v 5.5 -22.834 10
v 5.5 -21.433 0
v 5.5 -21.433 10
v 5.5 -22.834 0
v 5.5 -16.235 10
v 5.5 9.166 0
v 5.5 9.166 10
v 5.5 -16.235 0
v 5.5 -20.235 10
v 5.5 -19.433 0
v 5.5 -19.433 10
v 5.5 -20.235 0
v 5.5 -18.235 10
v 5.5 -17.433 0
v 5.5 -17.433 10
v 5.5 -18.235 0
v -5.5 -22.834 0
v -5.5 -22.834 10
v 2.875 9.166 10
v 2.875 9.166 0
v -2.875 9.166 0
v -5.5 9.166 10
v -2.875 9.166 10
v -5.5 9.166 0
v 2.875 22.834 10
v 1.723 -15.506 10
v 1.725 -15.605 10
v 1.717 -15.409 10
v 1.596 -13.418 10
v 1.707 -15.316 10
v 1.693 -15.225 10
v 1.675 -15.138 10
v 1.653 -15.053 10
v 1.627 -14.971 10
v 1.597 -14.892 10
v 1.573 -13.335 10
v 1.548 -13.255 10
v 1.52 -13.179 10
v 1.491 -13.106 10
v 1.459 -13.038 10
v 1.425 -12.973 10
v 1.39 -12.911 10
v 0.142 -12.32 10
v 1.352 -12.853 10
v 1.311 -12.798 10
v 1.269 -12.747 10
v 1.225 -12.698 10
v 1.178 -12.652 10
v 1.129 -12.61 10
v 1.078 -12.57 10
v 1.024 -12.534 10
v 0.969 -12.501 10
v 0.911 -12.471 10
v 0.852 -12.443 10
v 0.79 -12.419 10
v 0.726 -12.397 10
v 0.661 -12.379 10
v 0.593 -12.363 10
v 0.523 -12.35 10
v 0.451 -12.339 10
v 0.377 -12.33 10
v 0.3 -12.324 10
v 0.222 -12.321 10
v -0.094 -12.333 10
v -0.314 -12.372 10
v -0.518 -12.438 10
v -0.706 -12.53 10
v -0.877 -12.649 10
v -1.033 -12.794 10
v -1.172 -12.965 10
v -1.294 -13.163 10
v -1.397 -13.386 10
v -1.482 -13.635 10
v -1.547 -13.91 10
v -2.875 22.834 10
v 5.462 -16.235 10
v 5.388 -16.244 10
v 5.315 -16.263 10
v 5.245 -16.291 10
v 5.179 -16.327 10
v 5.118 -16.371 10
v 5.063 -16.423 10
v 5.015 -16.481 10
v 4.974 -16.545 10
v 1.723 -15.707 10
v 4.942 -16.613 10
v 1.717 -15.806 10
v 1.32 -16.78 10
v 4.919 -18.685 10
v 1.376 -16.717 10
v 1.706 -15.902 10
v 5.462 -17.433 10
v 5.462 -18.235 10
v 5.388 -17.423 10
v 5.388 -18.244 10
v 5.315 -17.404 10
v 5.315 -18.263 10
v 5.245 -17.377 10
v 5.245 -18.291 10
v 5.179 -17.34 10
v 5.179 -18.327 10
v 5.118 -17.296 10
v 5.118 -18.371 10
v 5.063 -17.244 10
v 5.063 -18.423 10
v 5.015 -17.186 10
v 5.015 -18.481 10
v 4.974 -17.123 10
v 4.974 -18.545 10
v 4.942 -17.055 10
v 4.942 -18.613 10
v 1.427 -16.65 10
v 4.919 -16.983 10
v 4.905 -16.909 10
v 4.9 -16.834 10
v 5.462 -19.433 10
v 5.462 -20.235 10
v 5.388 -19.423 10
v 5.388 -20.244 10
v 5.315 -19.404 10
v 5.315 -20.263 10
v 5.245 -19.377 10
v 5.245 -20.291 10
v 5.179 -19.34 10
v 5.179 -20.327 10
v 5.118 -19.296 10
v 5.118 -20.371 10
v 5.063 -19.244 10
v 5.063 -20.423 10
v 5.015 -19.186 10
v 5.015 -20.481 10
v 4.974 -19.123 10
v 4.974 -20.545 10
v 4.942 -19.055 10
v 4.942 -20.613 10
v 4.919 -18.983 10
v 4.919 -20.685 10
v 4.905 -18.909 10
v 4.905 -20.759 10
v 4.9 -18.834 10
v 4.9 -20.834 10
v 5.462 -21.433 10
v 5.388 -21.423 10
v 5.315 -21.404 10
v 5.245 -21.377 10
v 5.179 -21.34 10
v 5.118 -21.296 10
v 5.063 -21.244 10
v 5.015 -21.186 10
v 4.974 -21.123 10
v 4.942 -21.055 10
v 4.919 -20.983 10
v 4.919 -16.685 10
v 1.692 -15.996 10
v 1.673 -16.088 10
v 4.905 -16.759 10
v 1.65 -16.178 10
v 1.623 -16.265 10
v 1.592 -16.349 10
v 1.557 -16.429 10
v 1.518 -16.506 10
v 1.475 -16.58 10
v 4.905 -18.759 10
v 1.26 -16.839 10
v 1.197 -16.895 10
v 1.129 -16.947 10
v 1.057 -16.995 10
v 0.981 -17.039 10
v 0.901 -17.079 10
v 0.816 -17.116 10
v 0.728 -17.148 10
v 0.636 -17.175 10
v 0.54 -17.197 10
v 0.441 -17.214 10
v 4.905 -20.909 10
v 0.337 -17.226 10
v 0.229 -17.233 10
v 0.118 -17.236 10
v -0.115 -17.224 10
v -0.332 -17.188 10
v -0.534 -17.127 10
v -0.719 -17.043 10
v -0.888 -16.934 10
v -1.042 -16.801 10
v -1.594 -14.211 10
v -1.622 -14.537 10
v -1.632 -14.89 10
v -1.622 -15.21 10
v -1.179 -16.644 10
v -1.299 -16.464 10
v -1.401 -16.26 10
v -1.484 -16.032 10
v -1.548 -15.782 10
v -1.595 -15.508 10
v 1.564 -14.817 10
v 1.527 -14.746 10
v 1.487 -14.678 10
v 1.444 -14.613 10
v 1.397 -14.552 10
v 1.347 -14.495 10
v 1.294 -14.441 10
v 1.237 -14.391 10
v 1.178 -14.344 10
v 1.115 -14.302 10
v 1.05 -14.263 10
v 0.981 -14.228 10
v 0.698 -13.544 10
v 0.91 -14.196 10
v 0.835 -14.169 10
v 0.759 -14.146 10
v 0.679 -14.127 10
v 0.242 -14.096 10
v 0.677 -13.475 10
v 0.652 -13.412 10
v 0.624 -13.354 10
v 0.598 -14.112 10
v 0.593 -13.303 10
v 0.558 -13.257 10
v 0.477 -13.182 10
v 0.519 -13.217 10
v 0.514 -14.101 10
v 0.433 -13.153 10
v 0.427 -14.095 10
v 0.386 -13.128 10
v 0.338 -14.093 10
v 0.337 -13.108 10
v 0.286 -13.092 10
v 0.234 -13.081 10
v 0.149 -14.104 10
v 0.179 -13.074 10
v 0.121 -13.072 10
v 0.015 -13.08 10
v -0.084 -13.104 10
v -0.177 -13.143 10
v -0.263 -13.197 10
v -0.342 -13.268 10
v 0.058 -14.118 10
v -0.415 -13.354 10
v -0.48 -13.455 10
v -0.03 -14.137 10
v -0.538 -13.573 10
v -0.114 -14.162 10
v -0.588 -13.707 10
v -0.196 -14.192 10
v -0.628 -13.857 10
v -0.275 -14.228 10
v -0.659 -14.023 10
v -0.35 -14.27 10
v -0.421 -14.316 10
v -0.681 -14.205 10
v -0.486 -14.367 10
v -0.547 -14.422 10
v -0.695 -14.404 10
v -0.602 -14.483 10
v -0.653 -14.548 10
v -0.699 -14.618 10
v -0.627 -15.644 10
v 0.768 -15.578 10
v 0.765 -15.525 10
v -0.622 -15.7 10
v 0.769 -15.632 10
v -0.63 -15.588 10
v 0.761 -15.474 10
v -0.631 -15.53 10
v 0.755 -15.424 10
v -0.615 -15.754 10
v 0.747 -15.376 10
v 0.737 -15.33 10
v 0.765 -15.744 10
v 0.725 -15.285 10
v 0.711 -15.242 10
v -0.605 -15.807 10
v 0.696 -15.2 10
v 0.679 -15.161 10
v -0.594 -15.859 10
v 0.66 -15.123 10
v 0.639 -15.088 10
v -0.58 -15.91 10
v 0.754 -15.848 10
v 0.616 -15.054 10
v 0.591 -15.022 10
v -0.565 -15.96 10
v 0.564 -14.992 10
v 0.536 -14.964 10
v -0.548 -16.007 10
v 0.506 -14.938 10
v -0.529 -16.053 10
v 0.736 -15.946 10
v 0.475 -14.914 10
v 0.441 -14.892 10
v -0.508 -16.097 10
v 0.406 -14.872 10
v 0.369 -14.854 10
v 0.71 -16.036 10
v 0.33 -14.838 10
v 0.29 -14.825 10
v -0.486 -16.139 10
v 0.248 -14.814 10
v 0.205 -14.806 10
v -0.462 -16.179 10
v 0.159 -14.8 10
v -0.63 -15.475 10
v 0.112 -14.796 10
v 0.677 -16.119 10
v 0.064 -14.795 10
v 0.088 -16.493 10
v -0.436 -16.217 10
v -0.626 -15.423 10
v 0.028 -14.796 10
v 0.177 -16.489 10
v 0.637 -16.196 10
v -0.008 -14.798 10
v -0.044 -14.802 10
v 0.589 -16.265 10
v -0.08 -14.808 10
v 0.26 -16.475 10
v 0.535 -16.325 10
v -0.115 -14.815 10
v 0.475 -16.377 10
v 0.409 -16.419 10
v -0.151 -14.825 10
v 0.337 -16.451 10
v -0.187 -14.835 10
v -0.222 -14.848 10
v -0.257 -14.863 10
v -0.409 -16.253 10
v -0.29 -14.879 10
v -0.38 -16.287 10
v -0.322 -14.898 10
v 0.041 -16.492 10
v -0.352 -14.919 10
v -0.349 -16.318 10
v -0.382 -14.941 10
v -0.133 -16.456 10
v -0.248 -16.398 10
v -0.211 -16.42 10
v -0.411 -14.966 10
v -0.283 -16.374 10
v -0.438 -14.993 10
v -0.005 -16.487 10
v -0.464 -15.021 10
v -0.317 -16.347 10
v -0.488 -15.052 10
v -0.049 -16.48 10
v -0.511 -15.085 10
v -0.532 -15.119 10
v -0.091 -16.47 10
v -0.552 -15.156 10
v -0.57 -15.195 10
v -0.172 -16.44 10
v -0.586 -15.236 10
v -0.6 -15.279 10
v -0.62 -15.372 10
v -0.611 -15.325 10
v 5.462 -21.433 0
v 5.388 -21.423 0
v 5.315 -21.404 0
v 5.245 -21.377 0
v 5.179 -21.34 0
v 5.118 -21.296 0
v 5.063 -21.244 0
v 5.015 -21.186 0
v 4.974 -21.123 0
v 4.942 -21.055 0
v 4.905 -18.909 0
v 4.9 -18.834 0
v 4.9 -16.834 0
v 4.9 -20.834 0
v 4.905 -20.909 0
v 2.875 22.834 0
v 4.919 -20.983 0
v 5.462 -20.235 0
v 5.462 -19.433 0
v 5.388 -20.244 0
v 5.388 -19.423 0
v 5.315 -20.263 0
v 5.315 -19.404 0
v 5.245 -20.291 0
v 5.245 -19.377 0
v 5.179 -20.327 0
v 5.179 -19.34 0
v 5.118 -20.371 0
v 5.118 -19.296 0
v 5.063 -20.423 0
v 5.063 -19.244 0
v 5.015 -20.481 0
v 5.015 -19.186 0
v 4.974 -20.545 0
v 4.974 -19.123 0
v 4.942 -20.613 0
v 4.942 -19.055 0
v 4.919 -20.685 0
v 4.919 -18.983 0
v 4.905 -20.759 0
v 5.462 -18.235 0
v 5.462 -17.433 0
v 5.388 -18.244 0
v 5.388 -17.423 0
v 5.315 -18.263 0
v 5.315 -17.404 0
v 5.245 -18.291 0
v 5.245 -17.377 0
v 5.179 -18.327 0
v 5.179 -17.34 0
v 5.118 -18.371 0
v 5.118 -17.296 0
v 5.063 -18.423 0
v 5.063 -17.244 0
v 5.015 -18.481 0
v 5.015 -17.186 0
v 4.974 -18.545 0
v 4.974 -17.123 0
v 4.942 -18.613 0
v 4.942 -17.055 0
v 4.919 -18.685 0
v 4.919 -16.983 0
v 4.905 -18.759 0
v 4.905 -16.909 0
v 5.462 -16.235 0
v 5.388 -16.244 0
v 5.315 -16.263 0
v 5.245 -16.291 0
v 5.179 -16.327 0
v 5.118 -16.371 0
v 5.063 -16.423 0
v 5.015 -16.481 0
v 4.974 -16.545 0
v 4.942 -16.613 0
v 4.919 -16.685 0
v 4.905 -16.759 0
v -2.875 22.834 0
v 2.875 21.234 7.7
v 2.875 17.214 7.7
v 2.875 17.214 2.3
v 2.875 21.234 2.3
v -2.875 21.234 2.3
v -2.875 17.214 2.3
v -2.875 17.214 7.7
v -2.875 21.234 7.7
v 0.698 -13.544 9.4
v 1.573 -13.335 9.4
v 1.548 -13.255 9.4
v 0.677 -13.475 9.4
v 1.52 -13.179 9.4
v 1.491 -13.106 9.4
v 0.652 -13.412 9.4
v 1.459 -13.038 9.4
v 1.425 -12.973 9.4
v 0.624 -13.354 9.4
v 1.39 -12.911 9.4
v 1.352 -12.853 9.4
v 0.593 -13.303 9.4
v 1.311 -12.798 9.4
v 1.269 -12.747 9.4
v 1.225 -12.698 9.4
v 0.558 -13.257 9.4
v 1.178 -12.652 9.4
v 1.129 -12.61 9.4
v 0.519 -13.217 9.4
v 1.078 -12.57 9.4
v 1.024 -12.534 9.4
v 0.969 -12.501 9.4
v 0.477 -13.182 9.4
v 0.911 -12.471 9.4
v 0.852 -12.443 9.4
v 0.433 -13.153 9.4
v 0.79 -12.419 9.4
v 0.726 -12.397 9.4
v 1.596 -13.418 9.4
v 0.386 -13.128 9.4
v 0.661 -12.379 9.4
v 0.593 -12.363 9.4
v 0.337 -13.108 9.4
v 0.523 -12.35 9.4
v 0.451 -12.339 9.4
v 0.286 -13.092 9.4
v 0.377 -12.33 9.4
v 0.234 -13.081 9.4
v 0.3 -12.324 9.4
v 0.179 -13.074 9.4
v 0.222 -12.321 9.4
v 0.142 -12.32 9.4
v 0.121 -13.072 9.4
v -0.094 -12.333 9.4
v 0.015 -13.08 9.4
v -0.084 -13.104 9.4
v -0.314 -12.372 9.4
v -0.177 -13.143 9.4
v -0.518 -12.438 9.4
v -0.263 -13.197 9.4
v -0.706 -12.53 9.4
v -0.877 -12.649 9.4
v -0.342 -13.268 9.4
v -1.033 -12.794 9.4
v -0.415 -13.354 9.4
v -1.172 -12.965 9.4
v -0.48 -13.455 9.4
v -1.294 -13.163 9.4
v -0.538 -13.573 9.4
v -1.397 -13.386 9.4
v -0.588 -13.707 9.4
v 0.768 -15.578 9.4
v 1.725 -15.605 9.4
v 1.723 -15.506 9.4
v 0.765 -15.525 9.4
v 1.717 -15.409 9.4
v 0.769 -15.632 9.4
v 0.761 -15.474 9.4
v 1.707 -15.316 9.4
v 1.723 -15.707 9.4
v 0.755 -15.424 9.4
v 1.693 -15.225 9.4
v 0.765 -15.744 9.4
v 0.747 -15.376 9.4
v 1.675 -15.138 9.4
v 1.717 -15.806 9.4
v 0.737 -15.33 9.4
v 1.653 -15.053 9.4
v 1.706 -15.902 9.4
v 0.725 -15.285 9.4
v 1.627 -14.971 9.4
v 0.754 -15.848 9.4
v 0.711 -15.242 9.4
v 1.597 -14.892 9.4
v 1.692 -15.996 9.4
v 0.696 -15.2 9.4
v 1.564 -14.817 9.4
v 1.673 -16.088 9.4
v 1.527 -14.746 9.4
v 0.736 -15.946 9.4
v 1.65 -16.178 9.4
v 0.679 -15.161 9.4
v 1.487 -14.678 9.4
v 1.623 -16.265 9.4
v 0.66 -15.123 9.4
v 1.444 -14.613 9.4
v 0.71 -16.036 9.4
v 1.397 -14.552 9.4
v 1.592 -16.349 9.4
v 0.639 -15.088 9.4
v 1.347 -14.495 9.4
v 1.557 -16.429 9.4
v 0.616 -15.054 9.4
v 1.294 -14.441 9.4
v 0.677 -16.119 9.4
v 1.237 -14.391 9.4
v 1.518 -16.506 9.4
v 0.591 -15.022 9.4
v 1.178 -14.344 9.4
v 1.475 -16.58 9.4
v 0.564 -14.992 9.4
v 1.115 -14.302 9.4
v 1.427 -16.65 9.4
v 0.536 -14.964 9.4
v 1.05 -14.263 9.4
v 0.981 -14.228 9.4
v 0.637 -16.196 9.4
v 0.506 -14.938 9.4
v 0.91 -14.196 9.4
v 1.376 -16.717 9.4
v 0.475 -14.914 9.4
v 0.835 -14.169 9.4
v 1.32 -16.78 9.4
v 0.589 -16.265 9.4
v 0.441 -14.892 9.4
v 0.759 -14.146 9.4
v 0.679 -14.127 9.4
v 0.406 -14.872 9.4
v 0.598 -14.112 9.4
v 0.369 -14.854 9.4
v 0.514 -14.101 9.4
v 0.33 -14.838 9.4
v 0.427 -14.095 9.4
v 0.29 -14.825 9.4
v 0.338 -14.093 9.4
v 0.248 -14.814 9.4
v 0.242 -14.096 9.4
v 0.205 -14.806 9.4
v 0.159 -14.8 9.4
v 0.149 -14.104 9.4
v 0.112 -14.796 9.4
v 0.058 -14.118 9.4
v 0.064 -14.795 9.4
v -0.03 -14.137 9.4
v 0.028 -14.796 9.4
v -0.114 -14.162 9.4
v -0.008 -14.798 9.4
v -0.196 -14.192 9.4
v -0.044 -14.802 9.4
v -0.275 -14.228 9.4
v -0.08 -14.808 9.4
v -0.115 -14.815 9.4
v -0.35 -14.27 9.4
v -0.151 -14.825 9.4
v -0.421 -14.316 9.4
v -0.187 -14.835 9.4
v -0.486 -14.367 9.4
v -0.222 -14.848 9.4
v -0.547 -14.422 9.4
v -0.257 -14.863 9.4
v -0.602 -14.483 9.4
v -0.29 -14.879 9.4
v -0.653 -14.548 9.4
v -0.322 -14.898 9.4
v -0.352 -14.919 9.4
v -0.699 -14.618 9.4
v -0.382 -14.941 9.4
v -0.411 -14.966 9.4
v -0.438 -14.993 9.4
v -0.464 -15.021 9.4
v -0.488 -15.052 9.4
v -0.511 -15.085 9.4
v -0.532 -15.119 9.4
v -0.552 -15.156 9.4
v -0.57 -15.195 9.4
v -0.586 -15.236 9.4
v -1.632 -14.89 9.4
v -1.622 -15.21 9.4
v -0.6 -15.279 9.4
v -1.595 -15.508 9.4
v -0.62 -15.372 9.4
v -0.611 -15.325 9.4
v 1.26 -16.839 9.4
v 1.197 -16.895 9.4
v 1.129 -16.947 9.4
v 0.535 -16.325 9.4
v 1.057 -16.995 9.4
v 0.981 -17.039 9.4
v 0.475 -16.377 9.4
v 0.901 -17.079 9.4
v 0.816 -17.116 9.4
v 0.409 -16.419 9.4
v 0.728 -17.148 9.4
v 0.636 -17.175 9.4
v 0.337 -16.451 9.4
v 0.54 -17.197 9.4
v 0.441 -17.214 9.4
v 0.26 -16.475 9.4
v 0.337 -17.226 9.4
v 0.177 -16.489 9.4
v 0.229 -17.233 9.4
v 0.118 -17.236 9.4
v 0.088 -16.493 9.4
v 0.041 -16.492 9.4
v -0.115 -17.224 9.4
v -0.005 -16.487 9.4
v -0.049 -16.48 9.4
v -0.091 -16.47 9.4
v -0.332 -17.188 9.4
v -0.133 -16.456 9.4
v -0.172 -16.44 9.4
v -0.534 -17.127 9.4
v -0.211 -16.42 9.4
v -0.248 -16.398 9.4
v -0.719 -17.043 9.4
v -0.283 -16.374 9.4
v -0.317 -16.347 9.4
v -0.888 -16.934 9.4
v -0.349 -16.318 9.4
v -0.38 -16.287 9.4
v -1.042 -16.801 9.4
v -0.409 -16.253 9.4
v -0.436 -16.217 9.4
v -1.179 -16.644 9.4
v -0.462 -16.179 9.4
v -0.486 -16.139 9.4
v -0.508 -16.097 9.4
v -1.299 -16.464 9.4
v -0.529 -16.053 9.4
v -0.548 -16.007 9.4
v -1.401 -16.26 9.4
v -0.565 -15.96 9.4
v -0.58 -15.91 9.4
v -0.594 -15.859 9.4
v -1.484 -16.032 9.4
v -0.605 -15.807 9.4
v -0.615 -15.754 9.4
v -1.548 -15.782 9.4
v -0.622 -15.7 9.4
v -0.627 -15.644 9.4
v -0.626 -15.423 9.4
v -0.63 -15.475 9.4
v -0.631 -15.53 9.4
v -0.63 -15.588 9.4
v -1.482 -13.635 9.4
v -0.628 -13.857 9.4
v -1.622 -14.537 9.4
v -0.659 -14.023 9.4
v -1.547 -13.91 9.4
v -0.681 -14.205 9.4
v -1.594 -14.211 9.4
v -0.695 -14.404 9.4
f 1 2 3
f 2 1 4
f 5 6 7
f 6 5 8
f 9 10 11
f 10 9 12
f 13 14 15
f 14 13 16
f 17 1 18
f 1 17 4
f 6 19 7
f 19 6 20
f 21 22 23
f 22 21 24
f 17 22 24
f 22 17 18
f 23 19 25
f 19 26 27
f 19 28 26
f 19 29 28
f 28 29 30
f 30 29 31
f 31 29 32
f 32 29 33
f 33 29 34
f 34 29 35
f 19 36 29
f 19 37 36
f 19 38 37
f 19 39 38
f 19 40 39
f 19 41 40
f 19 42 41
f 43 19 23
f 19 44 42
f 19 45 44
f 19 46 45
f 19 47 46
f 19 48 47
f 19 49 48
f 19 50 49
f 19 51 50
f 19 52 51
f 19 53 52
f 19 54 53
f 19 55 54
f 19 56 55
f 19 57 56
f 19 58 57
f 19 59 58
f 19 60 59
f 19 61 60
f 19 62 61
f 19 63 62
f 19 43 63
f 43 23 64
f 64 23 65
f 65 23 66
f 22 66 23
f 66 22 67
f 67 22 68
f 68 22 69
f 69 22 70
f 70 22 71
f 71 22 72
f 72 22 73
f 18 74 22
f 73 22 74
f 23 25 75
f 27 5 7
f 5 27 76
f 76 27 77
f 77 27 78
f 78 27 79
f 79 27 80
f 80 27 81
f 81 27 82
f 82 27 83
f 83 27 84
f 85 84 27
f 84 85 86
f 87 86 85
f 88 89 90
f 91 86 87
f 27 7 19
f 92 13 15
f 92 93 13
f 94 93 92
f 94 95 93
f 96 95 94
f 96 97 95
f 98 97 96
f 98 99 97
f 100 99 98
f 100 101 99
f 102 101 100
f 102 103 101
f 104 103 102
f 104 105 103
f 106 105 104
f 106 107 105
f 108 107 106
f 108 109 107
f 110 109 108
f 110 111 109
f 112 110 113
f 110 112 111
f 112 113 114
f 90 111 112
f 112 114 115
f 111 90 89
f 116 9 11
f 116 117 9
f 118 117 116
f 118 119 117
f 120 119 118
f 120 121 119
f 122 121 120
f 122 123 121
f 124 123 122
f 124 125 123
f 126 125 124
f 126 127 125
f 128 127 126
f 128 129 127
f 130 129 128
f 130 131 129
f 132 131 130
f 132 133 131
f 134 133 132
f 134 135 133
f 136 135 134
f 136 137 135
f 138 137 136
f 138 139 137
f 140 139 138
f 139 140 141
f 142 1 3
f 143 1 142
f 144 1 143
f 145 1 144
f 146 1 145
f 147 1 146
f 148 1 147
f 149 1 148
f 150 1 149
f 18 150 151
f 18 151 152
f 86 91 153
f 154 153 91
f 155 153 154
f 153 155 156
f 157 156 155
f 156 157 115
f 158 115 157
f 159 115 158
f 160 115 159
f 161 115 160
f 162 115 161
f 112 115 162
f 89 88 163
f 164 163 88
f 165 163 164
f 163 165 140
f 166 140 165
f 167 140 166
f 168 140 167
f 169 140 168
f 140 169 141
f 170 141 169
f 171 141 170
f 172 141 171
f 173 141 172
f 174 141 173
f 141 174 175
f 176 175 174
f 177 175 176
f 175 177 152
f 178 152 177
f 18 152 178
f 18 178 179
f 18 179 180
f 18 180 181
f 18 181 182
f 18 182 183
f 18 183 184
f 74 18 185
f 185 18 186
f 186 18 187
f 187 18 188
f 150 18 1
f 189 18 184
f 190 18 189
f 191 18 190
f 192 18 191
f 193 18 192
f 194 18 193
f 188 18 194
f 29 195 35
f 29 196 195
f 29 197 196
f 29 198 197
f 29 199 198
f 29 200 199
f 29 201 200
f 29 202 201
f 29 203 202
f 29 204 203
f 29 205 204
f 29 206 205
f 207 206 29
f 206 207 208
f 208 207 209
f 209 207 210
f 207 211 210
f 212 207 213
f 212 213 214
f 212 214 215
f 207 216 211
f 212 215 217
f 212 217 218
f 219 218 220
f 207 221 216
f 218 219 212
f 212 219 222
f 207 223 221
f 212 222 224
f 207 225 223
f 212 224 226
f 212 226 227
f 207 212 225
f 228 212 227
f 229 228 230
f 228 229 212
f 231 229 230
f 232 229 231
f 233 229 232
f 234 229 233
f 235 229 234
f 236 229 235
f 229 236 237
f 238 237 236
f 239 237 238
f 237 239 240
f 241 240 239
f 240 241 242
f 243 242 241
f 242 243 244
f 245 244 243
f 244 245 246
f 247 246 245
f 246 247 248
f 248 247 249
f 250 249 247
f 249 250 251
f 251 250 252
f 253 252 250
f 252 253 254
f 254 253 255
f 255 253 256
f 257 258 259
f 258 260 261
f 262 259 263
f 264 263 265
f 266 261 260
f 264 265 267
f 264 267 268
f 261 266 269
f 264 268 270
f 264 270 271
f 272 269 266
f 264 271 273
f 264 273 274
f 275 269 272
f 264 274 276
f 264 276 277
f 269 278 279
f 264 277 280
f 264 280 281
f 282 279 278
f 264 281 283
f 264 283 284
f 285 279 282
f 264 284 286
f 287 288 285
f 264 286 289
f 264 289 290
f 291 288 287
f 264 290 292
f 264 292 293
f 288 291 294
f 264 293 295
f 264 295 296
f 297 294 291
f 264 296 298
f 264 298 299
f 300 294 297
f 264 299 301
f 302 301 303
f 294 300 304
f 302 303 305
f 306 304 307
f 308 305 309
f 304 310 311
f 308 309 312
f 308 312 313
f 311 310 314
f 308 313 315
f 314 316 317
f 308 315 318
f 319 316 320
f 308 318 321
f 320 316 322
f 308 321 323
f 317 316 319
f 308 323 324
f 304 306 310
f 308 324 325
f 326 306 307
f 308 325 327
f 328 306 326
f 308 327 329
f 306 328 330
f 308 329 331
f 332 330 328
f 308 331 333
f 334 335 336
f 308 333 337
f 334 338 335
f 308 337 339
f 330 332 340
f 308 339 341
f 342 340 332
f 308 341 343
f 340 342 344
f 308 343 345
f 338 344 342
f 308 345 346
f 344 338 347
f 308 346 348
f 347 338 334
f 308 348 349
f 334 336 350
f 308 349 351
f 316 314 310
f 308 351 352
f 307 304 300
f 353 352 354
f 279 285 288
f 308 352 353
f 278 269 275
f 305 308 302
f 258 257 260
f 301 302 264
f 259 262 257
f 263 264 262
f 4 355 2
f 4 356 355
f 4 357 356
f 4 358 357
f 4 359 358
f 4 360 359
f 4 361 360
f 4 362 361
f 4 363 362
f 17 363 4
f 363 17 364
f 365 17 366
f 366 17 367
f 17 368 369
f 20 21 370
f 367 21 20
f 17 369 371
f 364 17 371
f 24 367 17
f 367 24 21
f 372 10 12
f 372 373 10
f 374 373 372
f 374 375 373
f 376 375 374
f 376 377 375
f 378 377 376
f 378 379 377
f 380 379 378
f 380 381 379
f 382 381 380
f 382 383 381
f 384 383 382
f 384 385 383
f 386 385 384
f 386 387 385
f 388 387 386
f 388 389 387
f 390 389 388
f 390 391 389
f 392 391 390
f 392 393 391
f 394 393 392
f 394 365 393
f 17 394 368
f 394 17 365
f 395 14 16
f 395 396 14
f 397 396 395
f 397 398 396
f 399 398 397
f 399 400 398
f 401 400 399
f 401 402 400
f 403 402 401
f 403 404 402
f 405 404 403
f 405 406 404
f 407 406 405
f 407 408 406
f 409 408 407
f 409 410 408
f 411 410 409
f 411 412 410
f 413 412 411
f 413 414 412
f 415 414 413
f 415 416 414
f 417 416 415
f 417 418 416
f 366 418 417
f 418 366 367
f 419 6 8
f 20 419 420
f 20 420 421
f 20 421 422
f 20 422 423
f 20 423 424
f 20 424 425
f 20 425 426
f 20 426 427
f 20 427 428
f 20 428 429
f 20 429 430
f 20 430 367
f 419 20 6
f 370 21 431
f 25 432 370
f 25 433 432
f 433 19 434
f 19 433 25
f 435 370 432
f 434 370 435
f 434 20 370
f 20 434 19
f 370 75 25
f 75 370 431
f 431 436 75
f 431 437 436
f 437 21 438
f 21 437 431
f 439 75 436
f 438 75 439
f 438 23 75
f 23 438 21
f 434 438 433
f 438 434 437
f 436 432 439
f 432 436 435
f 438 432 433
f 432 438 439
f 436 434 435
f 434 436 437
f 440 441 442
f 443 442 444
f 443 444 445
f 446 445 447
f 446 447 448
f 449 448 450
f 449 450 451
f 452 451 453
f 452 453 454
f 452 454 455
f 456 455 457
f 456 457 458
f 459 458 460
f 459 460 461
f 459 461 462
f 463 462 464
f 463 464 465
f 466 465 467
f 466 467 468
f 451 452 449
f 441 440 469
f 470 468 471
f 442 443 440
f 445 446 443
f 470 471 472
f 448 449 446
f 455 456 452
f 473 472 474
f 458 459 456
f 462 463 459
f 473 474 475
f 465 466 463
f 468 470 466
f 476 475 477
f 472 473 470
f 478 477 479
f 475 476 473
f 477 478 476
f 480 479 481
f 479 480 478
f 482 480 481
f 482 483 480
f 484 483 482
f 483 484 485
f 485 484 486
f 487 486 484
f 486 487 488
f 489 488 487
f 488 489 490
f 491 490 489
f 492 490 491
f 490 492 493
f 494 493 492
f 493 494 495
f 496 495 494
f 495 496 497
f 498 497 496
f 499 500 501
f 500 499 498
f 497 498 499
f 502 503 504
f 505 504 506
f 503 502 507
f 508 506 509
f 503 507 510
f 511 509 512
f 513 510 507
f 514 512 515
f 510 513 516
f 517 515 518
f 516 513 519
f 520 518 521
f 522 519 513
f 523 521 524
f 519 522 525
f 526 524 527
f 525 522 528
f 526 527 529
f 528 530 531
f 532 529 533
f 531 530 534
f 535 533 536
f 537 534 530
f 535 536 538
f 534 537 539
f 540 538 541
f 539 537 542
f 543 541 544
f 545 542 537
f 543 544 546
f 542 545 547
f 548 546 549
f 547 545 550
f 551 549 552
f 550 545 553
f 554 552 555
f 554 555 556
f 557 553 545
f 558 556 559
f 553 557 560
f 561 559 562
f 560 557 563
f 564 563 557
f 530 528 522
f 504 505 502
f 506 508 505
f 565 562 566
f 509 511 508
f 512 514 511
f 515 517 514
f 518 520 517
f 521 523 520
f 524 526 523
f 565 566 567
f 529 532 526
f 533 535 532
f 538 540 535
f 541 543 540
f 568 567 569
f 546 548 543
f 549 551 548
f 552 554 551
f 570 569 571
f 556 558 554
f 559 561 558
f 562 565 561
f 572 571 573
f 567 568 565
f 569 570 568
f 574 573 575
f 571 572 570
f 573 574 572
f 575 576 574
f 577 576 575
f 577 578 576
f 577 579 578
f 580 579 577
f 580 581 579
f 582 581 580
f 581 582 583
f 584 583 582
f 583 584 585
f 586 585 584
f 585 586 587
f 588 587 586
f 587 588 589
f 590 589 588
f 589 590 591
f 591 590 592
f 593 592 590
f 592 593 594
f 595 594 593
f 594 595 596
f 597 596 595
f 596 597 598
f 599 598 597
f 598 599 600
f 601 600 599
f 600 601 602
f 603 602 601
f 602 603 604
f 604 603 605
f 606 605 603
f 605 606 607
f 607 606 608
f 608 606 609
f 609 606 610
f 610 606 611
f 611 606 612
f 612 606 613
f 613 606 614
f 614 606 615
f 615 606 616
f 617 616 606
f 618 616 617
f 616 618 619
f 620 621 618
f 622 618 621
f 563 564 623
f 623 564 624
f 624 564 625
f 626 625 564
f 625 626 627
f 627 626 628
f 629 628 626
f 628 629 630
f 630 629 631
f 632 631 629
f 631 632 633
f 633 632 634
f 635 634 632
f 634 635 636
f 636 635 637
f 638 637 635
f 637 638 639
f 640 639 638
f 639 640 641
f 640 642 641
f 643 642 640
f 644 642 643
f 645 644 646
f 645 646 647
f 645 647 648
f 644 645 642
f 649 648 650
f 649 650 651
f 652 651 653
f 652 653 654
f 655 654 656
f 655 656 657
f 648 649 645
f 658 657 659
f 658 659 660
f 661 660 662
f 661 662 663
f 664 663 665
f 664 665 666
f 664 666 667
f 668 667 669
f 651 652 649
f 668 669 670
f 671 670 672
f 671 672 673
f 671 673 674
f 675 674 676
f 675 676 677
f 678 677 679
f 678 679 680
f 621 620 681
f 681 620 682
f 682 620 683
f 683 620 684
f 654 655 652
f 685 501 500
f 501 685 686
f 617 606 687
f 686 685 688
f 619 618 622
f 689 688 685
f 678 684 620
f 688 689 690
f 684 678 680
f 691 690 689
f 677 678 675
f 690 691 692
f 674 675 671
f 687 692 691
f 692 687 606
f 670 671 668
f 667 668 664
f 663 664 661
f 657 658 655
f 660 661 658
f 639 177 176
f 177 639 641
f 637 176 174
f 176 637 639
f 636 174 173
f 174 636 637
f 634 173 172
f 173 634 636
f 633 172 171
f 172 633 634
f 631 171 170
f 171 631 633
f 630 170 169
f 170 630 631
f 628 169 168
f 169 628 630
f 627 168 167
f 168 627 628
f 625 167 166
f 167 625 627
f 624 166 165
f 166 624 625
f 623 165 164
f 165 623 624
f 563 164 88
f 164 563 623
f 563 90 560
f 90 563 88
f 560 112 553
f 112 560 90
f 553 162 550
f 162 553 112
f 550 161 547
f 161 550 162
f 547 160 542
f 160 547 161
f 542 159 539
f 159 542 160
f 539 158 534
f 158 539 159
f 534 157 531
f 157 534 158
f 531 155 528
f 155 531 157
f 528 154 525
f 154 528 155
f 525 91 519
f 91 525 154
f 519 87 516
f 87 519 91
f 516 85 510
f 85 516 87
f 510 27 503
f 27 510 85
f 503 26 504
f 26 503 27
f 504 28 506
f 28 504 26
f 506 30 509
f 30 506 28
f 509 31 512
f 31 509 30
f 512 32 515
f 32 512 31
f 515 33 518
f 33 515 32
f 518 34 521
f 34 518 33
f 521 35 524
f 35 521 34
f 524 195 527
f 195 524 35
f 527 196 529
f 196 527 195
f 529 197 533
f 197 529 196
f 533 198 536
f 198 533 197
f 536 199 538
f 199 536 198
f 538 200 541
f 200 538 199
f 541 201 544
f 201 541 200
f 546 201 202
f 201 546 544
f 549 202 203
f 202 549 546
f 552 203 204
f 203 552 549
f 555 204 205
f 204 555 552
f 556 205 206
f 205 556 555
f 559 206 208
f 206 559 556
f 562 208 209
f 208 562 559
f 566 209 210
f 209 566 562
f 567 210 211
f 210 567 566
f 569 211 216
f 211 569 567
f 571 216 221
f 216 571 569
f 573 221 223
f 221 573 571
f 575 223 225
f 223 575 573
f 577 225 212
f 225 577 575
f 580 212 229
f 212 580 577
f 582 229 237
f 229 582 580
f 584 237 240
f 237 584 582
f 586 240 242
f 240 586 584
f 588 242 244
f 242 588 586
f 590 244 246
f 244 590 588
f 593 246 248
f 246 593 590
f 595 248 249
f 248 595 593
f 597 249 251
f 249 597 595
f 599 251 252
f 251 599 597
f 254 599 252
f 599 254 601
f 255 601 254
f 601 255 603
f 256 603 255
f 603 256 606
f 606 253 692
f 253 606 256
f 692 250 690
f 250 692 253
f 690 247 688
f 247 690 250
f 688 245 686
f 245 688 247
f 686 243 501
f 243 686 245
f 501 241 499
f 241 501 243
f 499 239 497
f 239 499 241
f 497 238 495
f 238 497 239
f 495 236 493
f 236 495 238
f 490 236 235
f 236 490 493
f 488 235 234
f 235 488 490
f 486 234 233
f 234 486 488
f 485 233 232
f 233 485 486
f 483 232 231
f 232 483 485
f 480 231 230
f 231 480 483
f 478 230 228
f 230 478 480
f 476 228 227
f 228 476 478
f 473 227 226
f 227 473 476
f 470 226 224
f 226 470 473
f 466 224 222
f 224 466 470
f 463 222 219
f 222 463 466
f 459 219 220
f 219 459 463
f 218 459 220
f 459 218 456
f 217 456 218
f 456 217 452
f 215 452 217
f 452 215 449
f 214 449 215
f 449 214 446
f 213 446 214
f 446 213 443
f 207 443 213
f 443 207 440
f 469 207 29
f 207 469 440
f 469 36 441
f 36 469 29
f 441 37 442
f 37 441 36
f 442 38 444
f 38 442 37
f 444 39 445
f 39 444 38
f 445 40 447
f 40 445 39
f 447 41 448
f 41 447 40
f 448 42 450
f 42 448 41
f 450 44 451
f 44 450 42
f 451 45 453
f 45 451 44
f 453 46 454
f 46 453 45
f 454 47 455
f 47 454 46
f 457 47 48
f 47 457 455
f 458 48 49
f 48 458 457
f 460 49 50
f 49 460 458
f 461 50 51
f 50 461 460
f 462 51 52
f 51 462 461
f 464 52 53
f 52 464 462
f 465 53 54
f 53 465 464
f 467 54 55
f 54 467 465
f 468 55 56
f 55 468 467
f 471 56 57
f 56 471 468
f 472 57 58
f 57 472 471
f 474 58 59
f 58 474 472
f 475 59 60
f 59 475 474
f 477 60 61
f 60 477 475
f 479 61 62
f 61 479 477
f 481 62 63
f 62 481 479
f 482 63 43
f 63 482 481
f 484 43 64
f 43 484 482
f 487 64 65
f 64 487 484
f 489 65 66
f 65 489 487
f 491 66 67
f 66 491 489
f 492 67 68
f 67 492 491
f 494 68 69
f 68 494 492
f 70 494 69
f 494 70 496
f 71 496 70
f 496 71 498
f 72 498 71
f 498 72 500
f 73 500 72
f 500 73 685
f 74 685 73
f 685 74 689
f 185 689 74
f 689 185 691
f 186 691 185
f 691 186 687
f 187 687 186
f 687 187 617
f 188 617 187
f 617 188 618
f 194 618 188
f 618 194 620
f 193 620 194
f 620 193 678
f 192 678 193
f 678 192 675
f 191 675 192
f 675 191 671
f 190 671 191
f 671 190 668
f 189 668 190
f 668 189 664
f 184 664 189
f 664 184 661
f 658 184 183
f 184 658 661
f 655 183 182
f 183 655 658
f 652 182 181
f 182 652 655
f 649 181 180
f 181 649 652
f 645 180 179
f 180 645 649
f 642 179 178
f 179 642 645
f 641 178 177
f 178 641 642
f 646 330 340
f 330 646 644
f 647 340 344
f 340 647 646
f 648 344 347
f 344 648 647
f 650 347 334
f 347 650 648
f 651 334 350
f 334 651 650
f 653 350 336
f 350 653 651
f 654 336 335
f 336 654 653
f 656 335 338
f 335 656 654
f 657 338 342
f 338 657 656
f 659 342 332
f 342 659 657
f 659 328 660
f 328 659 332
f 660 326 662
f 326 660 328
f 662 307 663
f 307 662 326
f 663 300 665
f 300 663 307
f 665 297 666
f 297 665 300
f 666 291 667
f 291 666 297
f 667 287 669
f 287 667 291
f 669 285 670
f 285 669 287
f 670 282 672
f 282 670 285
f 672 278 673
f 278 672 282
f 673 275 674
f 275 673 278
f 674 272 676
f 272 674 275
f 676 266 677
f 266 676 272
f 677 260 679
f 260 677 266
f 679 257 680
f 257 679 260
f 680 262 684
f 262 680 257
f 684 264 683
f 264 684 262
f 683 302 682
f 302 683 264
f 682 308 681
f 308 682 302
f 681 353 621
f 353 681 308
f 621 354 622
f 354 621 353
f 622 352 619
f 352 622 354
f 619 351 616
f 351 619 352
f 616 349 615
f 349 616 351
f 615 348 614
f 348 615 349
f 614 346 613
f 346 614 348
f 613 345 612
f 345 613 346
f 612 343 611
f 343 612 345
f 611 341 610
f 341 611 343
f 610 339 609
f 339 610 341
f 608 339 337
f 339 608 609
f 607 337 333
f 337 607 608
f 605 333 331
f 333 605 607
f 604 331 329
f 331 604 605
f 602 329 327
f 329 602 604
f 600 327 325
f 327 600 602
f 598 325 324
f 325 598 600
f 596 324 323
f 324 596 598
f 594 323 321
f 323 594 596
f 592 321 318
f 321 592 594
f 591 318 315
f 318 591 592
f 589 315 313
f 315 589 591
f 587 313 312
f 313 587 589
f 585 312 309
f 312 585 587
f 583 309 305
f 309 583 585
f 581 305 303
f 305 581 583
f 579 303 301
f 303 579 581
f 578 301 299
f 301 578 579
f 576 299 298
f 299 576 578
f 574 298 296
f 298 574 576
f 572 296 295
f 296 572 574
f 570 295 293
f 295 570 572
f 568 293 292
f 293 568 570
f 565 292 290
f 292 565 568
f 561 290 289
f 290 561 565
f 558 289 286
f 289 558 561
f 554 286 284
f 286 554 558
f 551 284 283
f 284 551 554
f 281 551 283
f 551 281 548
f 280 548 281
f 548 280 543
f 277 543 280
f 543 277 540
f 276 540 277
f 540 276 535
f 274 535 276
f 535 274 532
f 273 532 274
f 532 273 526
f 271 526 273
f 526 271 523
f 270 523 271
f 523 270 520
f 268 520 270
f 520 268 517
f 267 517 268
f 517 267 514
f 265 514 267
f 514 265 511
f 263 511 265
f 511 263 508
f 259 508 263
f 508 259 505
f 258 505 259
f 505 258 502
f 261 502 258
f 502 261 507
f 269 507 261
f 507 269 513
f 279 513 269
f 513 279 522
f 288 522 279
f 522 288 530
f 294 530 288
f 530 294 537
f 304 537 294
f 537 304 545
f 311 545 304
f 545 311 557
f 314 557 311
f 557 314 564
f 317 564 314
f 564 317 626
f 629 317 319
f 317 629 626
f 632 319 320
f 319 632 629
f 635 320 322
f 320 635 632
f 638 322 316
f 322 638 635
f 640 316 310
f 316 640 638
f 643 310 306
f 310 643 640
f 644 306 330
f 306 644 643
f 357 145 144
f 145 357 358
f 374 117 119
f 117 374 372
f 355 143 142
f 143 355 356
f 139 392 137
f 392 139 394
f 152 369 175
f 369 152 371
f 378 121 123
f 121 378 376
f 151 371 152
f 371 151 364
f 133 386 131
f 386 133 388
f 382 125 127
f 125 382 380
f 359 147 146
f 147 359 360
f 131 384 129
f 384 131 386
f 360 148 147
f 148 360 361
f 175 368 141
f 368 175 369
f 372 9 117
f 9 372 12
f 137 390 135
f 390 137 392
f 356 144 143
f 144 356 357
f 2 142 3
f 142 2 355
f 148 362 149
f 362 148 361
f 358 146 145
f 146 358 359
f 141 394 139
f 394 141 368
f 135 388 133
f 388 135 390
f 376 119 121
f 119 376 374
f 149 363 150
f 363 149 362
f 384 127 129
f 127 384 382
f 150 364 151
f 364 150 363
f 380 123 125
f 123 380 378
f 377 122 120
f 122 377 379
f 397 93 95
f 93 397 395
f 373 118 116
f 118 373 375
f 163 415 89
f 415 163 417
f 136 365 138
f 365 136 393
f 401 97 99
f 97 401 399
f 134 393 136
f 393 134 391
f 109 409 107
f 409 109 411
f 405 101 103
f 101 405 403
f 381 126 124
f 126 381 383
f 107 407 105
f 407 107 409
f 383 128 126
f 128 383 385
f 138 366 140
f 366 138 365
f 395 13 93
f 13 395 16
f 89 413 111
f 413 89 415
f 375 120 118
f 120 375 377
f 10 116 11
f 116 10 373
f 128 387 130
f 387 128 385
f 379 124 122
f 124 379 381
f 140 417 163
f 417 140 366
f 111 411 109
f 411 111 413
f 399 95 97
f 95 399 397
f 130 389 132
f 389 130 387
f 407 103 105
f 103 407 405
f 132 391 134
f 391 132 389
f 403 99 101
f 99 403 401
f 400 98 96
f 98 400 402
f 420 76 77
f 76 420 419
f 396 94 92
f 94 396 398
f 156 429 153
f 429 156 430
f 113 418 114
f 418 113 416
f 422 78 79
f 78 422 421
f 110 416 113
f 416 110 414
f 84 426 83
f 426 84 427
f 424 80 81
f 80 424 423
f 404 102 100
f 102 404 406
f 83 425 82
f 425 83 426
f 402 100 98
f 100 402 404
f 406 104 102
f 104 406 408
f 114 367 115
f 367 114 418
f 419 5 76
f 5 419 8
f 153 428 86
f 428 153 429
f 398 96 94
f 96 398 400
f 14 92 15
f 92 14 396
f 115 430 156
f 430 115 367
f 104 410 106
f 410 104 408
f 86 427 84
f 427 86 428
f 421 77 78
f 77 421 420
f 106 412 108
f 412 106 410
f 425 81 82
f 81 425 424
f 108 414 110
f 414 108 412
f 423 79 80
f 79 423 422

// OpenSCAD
$fn = 50;

difference() {
	union() {
		translate(v = [0, 9.166250000000002, 0]) {
			rotate(a = [90, 0, 0]) {
				difference() {
					union() {
						translate(v = [-5.5, 0, 0]) {
							cube(size = [11.0, 10.0, 32.0]);
						}
						translate(v = [-2.875, 0, -13.667499999999999]) {
							cube(size = [5.75, 10.0, 13.767499999999998]);
						}
					}
					union() {
						translate(v = [-2.975, 2.3000000000000003, -12.067499999999999]) {
							cube(size = [5.95, 5.3999999999999995, 4.0200000000000005]);
						}
						translate(v = [0, 9.4, 24.0]) {
							rotate(a = [-90, 0, 0]) {
								linear_extrude(height = 0.7) {
									text(font = "Arial:style=Bold", halign = "center", size = 5.0, text = "6", valign = "center");
								}
							}
						}
						translate(v = [5.5, 10.1, 30.0]) {
							rotate(a = [90, 0, 0]) {
								cylinder(h = 10.2, r = 0.6);
							}
						}
						translate(v = [5.5, 10.1, 28.0]) {
							rotate(a = [90, 0, 0]) {
								cylinder(h = 10.2, r = 0.6);
							}
						}
						translate(v = [5.5, 10.1, 26.0]) {
							rotate(a = [90, 0, 0]) {
								cylinder(h = 10.2, r = 0.6);
							}
						}
					}
				}
			}
		}
	}
	union();
}
